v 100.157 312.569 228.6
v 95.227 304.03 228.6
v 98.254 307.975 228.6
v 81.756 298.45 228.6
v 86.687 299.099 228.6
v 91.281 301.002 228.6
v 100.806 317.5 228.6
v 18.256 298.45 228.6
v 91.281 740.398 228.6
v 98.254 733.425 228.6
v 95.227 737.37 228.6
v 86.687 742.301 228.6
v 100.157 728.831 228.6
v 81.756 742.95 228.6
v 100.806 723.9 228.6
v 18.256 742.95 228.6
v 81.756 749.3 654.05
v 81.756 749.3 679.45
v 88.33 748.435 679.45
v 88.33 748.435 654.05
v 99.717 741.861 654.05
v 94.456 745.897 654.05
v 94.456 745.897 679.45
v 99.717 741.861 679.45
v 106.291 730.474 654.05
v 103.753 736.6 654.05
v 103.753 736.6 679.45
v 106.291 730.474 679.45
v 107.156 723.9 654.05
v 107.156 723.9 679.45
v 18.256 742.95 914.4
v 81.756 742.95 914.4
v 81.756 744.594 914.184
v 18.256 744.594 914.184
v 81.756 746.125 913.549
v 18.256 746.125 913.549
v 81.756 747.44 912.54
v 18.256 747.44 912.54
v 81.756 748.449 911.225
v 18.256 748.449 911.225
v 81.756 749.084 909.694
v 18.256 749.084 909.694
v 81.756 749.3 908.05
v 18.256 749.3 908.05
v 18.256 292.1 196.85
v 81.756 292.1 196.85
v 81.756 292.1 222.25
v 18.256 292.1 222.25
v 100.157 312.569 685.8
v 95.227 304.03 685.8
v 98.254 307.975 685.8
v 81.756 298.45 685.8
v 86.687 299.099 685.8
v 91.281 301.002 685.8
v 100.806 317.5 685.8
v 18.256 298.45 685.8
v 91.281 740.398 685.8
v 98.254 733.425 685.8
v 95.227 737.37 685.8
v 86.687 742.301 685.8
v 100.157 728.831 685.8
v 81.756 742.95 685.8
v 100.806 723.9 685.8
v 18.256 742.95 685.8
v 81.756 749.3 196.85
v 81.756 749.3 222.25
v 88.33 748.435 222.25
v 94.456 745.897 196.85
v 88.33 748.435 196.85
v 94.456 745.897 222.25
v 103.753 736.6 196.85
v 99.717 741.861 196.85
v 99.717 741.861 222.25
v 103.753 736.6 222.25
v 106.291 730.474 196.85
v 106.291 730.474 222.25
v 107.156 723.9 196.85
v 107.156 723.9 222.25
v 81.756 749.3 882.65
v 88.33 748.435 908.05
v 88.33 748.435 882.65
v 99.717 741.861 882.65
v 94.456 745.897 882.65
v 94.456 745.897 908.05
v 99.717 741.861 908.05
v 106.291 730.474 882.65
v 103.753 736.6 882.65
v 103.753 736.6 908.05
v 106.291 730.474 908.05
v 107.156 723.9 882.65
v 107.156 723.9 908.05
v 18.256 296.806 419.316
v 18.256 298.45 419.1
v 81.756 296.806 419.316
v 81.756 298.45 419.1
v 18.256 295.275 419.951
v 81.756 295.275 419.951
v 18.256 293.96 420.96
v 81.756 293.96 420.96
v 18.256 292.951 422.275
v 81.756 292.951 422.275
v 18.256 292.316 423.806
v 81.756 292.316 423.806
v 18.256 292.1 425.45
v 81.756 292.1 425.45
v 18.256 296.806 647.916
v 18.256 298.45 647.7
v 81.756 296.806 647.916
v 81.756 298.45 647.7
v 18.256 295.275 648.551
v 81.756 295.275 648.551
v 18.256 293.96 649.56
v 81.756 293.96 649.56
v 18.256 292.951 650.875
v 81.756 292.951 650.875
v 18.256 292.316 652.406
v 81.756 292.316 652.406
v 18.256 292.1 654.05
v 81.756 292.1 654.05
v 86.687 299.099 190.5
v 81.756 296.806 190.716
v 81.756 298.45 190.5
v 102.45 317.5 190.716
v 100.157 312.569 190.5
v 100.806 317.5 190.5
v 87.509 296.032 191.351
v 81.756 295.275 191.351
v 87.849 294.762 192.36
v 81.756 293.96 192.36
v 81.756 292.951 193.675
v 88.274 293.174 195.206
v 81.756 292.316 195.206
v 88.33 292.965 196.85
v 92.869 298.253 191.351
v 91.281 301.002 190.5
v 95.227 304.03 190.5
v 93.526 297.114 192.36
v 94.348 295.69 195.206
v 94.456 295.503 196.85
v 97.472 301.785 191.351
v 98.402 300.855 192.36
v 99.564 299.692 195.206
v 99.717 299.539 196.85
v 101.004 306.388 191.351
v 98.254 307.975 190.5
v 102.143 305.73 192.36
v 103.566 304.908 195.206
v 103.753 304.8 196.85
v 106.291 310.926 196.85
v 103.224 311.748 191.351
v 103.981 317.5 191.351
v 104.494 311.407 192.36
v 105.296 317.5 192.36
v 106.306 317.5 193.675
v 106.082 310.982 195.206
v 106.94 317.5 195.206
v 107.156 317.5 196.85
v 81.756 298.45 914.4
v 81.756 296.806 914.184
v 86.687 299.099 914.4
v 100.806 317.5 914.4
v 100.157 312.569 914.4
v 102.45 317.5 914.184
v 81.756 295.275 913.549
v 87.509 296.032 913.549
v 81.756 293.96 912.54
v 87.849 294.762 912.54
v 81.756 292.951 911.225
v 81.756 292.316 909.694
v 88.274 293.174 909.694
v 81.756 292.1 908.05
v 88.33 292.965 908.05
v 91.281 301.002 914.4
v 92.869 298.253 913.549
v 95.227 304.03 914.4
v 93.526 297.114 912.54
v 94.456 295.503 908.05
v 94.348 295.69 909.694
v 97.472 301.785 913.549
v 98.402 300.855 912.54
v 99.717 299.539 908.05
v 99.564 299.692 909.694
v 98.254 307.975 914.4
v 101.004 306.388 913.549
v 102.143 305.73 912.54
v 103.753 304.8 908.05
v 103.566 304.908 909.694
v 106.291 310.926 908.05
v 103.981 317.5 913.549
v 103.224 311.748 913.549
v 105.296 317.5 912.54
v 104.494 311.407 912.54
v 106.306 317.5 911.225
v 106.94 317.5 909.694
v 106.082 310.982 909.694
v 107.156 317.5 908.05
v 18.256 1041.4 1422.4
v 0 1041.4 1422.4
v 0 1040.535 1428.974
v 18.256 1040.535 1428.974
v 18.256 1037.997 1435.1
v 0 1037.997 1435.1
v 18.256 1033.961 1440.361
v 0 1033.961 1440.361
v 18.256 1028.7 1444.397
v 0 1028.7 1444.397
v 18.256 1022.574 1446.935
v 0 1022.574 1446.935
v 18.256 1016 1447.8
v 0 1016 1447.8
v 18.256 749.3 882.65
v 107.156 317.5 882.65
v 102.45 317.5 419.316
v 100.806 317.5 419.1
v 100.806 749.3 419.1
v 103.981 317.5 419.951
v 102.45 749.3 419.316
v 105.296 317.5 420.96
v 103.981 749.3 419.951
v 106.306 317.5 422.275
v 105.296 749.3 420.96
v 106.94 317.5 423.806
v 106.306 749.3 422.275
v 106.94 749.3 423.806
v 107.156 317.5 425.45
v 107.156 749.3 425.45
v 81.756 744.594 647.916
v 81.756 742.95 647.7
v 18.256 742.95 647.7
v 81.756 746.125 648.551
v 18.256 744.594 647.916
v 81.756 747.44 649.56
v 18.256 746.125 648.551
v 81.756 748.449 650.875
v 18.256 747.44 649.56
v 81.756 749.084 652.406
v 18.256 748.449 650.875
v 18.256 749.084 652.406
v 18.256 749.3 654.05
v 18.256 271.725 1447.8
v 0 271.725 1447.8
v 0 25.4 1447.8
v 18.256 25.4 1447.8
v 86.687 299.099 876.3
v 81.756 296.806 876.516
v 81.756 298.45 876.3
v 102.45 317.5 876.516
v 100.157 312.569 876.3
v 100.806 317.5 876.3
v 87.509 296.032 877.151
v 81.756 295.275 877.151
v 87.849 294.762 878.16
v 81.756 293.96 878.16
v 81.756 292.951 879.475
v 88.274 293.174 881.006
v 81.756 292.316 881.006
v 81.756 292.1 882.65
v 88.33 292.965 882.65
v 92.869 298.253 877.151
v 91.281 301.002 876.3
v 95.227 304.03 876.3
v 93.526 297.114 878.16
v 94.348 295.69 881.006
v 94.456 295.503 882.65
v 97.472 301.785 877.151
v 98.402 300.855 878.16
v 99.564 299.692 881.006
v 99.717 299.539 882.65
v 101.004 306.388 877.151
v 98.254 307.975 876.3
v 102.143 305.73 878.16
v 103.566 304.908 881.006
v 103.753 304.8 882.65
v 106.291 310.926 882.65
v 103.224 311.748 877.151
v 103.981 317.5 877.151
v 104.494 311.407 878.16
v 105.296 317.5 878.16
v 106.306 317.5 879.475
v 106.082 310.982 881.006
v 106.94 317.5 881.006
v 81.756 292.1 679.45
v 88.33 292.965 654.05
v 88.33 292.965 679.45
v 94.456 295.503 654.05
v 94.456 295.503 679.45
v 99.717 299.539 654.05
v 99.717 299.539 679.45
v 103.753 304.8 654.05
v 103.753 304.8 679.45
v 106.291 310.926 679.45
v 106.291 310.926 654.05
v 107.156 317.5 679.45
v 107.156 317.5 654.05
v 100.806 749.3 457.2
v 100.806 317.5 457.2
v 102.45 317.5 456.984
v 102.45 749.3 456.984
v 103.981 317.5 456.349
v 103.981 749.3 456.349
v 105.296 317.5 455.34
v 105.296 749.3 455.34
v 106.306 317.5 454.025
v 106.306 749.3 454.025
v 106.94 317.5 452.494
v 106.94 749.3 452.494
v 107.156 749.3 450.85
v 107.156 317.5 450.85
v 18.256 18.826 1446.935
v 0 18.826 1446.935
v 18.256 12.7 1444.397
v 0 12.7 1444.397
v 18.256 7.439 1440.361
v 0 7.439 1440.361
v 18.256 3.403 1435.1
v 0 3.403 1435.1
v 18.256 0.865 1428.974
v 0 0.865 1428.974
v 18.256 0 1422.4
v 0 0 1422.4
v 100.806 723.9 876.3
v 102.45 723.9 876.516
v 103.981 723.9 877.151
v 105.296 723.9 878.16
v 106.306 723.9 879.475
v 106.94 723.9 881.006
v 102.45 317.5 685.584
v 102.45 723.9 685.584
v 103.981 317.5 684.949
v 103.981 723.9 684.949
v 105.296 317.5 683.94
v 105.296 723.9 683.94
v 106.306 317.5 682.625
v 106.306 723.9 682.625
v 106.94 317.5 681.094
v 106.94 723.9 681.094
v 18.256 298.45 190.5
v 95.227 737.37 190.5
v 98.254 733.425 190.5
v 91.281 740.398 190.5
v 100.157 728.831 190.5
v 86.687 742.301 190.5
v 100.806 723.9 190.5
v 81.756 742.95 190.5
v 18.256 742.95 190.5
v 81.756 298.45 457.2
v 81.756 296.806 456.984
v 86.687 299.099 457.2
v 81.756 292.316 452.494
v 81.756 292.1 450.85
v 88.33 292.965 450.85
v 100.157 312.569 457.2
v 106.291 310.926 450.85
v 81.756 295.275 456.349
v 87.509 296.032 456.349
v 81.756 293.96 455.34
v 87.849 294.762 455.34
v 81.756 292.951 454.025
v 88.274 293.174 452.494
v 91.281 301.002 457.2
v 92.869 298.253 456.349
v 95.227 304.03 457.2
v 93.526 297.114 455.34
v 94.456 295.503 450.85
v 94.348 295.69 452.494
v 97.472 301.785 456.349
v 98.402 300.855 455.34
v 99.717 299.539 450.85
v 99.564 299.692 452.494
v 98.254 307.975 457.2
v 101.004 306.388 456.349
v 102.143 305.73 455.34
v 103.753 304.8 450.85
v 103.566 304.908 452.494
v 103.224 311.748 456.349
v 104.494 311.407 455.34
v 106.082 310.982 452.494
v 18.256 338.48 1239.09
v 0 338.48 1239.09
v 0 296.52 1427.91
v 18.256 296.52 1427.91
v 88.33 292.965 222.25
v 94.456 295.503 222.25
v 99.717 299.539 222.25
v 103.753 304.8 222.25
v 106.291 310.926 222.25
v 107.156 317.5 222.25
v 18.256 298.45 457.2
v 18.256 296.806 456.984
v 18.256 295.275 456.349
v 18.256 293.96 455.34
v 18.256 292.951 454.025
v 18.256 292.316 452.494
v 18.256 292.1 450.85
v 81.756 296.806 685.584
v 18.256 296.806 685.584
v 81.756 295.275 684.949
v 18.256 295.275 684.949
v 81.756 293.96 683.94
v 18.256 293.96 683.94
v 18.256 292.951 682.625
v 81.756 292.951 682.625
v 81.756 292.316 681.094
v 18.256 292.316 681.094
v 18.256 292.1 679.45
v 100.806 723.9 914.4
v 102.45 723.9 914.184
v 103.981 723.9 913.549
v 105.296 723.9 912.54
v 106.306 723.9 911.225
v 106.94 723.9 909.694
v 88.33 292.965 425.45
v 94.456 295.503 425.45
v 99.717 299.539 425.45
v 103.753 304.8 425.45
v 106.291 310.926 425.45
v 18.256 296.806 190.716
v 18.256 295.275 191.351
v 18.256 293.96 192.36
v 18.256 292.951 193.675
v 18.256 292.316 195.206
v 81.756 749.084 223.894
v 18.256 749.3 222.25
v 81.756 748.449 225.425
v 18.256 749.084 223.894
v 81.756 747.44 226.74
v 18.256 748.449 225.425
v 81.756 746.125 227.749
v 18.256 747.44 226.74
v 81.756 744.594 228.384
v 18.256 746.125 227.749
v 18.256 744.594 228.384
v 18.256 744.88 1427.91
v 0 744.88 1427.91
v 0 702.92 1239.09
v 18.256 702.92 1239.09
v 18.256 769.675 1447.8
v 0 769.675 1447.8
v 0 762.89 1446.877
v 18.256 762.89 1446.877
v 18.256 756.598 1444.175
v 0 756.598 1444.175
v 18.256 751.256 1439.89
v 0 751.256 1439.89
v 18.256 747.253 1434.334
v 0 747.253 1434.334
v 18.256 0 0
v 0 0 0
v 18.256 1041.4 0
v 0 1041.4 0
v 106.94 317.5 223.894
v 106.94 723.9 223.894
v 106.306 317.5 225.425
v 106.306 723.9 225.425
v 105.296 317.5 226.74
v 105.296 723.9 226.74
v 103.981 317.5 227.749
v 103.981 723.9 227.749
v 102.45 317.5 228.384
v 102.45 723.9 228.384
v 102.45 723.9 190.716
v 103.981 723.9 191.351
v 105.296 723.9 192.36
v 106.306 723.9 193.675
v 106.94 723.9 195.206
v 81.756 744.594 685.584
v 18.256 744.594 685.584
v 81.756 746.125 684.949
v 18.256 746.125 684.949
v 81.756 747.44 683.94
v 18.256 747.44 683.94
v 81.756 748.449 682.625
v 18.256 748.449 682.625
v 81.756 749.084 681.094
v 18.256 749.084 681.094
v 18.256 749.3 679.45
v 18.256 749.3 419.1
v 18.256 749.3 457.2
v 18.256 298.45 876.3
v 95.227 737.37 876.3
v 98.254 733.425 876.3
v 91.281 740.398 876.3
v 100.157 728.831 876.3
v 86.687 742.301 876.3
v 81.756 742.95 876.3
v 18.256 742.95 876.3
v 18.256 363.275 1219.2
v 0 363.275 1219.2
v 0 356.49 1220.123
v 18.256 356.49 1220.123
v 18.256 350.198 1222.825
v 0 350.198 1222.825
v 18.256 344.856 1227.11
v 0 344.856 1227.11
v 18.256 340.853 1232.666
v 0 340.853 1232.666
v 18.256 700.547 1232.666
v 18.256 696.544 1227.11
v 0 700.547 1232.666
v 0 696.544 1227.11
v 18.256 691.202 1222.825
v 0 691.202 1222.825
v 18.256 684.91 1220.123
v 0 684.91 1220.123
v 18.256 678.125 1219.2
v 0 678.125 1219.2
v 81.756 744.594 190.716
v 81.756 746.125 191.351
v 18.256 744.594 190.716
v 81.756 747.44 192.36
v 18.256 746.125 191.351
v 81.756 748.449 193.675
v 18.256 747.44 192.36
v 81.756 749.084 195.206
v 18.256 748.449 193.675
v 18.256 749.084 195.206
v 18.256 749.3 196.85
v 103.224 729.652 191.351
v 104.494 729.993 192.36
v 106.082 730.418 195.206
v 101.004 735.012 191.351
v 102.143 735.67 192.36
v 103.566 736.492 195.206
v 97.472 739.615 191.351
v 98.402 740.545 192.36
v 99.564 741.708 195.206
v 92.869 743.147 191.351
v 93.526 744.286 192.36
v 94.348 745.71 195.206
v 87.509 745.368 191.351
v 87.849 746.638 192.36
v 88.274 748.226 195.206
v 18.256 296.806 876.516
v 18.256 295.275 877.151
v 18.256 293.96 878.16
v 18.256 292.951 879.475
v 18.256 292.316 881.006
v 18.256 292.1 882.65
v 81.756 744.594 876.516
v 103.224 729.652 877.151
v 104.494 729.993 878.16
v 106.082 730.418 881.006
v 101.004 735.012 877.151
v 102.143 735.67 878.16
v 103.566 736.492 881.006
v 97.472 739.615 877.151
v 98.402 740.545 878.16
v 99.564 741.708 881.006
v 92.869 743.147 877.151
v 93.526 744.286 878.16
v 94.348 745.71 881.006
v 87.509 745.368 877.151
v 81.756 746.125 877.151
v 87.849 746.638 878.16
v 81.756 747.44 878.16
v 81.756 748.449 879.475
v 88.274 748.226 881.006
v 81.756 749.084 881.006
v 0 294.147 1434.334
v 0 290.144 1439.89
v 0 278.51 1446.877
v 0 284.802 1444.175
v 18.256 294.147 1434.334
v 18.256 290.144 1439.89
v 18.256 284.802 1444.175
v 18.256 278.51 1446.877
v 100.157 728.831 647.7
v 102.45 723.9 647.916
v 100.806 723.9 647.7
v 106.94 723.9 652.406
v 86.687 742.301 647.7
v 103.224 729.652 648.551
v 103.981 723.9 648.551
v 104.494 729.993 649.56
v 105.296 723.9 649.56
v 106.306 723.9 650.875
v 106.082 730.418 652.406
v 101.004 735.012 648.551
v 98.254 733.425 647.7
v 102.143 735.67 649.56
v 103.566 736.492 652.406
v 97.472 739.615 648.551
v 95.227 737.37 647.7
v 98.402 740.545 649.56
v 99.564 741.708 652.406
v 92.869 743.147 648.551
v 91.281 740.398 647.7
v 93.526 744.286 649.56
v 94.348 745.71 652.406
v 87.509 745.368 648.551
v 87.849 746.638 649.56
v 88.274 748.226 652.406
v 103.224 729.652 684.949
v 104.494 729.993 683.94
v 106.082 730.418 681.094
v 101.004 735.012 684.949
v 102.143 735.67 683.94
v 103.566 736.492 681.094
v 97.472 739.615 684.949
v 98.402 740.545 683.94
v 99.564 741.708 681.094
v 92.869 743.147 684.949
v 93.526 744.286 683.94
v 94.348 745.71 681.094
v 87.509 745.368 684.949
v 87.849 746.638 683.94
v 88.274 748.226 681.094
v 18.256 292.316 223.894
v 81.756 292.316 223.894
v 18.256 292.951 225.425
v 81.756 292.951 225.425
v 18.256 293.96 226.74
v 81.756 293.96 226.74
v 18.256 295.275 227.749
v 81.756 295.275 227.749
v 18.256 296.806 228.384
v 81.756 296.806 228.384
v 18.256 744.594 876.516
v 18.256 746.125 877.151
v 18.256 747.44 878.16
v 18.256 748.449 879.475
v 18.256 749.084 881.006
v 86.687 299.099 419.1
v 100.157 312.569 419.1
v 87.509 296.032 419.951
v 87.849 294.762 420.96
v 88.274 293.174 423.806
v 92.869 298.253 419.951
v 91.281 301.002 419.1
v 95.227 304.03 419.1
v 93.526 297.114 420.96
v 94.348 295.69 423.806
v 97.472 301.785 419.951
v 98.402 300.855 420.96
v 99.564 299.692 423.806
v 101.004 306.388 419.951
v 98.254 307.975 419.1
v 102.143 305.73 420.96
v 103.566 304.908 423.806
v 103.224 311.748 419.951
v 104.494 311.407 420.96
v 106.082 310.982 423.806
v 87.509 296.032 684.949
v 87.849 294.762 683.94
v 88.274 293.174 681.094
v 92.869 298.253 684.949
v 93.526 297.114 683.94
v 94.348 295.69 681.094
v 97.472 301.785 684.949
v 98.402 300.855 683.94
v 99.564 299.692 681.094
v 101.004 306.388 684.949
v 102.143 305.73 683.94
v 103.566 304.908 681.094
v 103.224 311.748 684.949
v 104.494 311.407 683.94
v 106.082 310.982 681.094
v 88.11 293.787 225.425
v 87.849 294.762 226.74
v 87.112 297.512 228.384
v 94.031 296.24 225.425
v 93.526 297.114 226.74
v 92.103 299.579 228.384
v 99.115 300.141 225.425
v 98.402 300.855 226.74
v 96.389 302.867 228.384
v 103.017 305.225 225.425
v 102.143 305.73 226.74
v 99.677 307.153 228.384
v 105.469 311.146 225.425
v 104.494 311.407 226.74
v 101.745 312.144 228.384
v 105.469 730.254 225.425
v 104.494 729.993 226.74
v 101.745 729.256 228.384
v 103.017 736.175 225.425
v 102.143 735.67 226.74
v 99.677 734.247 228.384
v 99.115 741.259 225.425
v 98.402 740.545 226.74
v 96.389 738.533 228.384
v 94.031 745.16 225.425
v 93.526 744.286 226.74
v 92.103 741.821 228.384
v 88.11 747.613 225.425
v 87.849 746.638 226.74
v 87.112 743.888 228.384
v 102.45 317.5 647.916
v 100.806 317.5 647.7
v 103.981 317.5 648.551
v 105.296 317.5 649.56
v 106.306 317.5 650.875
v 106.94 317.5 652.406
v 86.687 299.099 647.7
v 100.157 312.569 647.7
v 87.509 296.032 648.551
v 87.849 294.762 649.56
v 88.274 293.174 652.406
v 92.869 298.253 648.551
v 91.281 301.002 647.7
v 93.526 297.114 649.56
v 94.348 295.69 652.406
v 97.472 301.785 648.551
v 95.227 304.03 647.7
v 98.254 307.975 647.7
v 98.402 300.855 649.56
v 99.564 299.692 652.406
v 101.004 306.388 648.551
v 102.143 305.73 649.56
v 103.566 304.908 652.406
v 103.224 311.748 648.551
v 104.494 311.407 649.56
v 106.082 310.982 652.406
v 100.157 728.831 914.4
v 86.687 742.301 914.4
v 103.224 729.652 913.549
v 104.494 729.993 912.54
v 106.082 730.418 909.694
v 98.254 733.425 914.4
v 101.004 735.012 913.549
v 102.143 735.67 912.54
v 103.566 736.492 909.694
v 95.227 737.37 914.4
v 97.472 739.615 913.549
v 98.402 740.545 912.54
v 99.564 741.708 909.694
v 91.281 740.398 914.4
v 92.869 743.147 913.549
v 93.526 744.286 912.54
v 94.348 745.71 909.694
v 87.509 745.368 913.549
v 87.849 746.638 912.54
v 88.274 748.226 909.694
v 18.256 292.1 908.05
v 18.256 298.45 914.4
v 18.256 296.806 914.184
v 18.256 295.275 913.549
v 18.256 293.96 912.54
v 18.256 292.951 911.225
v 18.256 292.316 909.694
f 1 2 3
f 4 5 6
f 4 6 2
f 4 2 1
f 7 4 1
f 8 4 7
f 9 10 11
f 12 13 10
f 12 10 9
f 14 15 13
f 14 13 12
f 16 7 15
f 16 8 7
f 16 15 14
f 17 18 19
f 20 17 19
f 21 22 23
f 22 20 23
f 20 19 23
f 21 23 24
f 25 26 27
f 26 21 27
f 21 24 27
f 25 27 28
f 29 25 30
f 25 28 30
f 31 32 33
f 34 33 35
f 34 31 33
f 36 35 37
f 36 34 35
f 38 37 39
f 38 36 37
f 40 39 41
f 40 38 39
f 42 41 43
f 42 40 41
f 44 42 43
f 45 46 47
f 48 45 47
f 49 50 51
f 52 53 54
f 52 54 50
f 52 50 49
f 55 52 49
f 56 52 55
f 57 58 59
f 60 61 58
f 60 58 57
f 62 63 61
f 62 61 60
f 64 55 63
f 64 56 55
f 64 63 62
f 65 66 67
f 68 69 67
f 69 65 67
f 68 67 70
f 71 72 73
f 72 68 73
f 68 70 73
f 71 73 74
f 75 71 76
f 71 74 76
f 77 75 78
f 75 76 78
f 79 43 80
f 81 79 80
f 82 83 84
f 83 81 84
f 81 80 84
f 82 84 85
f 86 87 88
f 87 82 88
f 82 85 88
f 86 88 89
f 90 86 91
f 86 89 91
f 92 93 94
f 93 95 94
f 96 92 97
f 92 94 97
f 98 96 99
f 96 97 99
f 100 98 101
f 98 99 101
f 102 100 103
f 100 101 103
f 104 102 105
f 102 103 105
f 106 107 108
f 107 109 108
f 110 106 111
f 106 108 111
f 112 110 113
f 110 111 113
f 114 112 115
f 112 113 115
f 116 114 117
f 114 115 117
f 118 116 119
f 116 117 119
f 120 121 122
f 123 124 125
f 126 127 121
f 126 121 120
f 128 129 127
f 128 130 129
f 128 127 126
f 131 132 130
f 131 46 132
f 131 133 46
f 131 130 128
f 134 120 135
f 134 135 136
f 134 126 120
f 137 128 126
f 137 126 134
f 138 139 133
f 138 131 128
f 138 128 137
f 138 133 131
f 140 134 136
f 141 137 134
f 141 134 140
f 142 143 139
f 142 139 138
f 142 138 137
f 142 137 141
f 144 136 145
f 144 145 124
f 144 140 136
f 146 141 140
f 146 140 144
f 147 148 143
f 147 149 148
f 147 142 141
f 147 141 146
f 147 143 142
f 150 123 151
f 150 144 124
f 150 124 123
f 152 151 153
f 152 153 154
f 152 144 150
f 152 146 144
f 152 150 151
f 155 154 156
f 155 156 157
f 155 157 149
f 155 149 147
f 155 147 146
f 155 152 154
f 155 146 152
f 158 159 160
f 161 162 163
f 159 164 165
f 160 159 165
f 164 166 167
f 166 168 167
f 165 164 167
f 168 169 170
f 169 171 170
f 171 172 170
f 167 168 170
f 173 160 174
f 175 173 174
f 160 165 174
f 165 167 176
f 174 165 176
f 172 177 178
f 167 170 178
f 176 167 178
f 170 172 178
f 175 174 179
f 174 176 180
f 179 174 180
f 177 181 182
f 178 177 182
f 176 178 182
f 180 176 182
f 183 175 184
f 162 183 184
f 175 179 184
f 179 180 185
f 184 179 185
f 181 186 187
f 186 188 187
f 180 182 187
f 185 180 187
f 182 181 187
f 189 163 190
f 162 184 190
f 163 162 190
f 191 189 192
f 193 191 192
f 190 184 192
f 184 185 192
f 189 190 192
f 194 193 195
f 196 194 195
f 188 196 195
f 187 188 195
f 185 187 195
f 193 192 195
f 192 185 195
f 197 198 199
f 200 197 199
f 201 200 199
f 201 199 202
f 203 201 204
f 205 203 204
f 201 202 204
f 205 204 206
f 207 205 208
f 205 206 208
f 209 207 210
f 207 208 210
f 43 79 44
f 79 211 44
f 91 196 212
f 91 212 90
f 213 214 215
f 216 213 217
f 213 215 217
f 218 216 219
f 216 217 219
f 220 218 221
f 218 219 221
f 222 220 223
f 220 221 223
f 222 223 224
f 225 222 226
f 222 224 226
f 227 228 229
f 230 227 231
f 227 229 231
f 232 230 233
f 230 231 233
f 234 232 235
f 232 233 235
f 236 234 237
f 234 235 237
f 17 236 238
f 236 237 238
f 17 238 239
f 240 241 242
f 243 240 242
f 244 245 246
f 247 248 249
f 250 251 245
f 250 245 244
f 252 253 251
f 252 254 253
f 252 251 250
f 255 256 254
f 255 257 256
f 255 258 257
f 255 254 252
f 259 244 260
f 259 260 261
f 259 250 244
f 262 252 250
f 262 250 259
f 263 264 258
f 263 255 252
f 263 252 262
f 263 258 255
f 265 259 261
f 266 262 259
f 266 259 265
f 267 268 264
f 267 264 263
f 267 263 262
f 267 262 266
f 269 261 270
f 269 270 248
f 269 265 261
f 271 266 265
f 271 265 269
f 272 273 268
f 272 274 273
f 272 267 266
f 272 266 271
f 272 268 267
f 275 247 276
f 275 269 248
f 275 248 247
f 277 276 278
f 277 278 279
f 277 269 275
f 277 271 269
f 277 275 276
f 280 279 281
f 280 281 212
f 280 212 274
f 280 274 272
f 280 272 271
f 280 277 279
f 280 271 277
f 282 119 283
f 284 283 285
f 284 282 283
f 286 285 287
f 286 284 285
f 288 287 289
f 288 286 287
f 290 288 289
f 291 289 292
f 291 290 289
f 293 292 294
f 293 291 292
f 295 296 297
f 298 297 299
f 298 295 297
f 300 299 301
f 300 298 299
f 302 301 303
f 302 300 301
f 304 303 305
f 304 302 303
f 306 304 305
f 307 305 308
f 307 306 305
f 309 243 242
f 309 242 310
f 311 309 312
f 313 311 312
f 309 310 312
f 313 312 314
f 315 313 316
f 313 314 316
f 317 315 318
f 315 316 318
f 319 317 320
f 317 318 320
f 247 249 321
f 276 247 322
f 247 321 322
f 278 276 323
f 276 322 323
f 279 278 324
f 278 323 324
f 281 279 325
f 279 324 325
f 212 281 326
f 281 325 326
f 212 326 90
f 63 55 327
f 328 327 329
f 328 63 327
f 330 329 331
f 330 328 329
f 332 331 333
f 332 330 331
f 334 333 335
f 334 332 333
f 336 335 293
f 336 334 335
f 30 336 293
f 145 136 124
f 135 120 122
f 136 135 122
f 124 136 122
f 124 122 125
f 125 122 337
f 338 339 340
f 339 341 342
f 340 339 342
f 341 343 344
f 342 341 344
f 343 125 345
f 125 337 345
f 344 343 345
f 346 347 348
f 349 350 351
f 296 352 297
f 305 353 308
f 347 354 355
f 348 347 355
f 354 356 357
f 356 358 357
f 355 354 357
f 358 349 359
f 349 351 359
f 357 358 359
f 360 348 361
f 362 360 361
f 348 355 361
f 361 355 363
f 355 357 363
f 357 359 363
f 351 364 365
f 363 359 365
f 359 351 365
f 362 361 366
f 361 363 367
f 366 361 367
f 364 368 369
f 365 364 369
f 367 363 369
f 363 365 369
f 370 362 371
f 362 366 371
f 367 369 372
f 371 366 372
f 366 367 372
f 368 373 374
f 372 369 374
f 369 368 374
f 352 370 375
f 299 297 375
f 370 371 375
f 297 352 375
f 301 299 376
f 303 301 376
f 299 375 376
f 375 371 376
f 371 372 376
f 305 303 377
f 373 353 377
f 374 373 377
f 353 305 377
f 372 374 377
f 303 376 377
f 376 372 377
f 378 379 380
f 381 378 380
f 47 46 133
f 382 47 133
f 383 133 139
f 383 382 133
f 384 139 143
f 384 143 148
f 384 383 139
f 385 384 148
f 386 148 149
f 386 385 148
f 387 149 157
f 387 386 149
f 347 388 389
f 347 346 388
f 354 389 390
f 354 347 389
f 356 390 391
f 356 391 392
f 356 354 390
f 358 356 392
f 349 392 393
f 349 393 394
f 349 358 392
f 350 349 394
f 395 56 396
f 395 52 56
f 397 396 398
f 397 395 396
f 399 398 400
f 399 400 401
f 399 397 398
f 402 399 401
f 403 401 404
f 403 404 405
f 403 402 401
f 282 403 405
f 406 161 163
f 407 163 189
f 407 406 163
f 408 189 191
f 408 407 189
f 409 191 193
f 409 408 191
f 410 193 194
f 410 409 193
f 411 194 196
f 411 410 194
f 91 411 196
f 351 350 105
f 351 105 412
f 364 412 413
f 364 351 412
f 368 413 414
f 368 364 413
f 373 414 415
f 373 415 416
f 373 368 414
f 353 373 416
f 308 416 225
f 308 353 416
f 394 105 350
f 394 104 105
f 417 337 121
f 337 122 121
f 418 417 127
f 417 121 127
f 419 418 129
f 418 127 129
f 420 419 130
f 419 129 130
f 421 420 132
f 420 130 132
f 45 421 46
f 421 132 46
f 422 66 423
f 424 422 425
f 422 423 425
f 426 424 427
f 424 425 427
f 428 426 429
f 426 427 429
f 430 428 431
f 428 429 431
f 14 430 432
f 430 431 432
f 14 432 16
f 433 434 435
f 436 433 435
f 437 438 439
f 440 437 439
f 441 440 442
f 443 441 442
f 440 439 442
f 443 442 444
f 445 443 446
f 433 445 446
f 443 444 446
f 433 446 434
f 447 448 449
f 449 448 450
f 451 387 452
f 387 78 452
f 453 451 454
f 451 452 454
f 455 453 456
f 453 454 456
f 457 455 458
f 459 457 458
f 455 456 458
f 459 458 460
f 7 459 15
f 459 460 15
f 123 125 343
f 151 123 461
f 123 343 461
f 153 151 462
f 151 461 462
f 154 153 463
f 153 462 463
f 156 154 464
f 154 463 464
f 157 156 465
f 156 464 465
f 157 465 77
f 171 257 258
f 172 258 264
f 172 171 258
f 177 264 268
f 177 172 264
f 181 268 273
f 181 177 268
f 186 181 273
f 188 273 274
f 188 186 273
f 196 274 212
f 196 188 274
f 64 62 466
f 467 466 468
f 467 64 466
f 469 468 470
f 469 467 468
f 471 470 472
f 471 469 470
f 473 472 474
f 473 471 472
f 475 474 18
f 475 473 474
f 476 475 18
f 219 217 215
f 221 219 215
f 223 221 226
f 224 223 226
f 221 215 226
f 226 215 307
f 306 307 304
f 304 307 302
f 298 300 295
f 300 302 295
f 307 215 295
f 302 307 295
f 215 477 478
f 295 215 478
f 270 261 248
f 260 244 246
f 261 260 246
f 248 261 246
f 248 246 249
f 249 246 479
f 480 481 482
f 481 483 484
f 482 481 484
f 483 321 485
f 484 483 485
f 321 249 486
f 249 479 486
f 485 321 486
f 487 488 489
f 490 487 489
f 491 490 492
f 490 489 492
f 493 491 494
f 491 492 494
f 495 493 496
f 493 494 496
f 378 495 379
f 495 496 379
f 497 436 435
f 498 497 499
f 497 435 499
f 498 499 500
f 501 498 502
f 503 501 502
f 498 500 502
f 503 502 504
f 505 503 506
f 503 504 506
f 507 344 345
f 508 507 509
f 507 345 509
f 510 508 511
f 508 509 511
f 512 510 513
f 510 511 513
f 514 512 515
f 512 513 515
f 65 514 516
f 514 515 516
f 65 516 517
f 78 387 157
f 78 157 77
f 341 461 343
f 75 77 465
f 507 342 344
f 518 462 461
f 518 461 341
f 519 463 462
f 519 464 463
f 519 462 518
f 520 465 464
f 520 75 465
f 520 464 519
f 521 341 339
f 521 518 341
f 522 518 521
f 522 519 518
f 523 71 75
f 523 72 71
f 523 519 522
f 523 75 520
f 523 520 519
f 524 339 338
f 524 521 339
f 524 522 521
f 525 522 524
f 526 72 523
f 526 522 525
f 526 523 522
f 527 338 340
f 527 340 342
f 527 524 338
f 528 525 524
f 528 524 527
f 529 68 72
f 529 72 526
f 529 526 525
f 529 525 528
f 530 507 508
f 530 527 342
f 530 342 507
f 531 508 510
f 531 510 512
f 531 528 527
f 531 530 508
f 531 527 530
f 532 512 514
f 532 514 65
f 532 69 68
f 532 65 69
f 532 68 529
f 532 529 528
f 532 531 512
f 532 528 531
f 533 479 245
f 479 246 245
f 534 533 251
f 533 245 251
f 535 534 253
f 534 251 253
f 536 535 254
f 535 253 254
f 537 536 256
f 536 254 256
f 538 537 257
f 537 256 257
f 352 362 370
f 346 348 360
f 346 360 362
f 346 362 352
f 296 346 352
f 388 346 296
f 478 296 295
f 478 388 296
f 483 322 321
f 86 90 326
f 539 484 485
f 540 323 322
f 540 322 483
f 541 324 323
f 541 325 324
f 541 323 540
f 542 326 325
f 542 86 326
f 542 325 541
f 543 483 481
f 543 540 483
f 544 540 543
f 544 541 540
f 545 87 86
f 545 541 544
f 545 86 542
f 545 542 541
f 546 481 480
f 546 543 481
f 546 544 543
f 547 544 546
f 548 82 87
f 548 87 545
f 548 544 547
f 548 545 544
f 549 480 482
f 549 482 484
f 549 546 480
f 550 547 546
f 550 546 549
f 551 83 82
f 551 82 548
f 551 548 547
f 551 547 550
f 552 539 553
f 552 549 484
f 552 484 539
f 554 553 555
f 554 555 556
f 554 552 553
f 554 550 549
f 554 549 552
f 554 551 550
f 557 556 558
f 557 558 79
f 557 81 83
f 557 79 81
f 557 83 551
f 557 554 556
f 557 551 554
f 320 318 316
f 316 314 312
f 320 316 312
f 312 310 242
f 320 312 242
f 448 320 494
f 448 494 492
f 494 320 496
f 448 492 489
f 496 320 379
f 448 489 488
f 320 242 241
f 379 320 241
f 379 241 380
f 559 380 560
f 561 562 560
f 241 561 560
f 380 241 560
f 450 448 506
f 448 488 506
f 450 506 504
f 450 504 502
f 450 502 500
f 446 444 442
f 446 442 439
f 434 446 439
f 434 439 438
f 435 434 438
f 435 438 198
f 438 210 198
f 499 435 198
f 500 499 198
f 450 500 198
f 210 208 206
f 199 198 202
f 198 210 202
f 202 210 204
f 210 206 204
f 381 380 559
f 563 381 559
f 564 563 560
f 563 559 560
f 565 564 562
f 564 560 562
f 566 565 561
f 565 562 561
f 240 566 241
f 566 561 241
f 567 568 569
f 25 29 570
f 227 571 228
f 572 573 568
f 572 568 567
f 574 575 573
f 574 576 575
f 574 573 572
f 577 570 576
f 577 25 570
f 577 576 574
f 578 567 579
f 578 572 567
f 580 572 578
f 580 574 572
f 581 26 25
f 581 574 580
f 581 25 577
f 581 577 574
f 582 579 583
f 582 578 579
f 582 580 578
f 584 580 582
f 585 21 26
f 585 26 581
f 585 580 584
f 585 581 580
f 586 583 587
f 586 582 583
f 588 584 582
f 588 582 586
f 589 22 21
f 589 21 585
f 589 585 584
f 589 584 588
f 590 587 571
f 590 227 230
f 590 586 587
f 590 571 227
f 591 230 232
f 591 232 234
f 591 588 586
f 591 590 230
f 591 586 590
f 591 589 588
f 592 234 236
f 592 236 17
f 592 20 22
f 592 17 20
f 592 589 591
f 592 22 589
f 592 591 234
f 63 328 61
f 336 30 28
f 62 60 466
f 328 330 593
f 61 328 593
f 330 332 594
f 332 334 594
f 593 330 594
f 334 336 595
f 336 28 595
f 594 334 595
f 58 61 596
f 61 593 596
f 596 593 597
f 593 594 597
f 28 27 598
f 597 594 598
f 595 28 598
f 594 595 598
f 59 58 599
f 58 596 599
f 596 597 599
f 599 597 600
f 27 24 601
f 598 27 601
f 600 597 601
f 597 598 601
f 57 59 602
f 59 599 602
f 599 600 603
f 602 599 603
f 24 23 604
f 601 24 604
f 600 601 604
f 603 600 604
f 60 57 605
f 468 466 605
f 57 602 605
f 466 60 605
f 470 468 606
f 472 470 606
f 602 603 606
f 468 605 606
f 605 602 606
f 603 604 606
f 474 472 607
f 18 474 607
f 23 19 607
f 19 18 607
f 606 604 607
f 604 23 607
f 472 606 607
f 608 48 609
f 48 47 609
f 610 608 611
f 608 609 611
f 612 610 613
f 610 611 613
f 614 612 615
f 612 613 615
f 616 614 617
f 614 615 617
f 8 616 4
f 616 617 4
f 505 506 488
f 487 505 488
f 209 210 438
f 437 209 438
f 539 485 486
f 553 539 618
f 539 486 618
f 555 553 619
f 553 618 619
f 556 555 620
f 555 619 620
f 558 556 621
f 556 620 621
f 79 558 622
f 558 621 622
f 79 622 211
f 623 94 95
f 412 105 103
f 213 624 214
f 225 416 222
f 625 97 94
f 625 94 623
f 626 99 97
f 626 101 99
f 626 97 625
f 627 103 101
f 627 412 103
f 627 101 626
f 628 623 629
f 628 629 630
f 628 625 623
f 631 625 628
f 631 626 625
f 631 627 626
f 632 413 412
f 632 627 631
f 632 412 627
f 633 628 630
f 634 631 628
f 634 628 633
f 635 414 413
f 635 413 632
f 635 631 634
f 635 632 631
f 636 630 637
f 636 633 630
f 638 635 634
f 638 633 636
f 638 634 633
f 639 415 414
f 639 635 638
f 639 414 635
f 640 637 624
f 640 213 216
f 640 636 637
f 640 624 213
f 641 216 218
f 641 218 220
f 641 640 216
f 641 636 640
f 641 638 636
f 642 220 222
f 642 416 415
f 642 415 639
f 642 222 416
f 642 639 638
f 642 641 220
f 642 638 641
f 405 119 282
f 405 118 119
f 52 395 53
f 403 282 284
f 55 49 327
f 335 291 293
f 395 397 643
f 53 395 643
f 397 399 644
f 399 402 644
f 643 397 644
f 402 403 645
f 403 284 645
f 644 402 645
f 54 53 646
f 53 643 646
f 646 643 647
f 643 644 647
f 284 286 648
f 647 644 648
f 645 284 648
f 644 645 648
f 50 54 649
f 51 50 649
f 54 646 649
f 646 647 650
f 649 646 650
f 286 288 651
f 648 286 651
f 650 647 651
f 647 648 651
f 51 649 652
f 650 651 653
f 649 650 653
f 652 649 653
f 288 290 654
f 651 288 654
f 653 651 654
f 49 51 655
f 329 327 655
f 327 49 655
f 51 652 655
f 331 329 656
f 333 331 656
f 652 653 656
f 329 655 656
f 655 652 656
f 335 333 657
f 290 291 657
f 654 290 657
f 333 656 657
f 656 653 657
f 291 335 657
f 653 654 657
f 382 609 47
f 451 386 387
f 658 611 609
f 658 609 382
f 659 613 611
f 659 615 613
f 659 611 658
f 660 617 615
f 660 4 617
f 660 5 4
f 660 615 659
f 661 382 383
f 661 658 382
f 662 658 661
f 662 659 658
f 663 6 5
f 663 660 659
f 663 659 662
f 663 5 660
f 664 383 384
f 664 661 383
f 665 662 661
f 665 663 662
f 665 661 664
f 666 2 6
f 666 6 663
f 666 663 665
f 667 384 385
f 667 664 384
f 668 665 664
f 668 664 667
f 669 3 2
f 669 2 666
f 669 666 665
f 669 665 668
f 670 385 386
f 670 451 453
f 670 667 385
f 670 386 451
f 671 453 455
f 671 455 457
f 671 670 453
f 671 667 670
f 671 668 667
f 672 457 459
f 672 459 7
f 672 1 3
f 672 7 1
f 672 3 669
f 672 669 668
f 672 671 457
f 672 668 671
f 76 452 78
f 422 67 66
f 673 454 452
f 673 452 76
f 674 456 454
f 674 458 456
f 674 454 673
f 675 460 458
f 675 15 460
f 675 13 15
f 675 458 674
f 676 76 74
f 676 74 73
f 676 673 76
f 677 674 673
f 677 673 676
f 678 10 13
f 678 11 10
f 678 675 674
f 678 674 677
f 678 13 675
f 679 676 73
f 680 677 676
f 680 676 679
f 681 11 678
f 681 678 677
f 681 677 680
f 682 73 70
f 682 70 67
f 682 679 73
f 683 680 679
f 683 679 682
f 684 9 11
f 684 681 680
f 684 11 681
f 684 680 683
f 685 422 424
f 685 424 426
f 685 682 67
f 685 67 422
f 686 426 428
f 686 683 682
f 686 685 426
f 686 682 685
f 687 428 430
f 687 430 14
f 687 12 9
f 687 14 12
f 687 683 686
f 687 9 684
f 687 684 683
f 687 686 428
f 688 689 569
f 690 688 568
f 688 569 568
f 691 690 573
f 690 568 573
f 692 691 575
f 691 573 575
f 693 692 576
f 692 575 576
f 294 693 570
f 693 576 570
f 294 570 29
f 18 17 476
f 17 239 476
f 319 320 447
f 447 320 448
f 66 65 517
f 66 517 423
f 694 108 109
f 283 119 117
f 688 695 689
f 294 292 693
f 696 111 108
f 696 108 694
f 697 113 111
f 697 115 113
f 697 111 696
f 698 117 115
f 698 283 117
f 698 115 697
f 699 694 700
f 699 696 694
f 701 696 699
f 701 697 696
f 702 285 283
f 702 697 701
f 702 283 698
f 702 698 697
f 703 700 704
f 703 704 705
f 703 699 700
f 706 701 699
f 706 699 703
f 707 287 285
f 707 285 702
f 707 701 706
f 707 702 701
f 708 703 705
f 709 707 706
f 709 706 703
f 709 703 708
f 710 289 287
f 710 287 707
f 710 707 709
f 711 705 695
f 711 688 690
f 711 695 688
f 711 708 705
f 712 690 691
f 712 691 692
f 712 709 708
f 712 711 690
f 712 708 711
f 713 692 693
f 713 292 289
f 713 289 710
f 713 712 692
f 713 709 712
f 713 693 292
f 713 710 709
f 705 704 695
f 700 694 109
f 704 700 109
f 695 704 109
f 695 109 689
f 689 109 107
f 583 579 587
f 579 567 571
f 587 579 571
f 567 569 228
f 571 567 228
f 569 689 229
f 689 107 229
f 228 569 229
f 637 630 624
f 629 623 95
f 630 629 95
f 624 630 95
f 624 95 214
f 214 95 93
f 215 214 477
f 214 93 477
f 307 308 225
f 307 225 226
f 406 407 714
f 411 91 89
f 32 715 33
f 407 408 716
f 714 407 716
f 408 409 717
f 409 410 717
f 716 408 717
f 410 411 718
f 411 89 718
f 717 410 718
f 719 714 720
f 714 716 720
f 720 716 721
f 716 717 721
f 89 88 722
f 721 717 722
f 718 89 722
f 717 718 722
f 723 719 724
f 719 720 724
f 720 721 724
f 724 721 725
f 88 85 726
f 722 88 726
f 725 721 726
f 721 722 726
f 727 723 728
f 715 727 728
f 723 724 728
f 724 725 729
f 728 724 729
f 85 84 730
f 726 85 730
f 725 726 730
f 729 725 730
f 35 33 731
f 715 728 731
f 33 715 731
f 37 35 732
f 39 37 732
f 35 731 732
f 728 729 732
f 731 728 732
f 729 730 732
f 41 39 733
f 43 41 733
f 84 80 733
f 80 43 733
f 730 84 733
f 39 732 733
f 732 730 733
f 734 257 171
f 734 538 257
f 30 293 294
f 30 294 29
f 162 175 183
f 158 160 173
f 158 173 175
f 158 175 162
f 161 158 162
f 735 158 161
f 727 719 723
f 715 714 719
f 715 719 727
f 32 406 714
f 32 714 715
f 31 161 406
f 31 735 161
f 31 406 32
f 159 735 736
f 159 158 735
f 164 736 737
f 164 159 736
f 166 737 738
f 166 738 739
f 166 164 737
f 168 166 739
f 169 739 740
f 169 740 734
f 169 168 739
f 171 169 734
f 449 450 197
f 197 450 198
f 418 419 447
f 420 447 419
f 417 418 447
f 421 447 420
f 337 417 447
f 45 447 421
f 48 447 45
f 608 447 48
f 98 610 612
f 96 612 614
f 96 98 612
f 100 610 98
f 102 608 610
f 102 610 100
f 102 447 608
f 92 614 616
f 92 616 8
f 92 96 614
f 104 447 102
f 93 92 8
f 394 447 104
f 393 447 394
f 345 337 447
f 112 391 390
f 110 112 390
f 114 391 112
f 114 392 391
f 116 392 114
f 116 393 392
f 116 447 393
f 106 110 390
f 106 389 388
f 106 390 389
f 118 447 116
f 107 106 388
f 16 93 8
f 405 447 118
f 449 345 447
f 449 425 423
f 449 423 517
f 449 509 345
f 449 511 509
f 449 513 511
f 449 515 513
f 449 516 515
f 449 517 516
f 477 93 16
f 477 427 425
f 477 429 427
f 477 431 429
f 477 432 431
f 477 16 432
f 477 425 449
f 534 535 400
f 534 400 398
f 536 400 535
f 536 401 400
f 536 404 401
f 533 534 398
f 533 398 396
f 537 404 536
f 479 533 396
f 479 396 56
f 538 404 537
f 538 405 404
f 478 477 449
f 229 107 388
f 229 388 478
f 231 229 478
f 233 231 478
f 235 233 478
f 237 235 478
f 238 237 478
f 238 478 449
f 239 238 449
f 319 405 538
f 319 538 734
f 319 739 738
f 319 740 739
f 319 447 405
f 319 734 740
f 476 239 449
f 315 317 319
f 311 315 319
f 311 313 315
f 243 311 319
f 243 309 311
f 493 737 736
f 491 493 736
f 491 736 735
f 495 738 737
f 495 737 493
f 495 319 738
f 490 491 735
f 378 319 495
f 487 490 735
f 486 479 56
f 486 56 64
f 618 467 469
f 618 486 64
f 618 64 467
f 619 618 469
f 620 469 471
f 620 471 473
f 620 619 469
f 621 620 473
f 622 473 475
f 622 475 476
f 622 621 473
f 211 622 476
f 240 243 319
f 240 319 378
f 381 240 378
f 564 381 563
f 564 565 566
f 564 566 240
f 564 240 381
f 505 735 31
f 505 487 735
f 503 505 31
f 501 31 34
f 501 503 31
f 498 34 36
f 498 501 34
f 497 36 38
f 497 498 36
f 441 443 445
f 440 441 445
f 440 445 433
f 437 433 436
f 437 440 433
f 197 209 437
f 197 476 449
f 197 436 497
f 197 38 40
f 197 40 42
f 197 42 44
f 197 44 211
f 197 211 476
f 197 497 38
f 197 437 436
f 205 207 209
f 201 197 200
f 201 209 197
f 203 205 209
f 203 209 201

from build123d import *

# Parameters (mm, degrees)
F1_DEPTH = 18.25625
F2_W     = 457.2
F2_H     = 38.1
F3_DEPTH = 88.9
F4_R     = 25.4
F5_R     = 6.35


with BuildPart() as f1:
    # F0 (on Right) → F1 (new body)
    with BuildSketch(Plane.YZ):
        with BuildLine():
            Line((0, 1422.4), (0, 0))
            Line((0, 0), (1041.4, 0))
            Line((1041.4, 0), (1041.4, 1422.4))
            ThreePointArc((1041.4, 1422.4), (1033.960512, 1440.360512), (1016, 1447.8))
            Line((1016, 1447.8), (769.675159, 1447.8))
            ThreePointArc((769.675159, 1447.8), (753.781683, 1442.213062), (744.880007, 1427.910034))
            Line((744.880007, 1427.910034), (702.919993, 1239.089966))
            ThreePointArc((702.919993, 1239.089966), (694.018317, 1224.786938), (678.124841, 1219.2))
            Line((678.124841, 1219.2), (363.275159, 1219.2))
            ThreePointArc((363.275159, 1219.2), (347.381683, 1224.786938), (338.480007, 1239.089966))
            Line((338.480007, 1239.089966), (296.519993, 1427.910034))
            ThreePointArc((296.519993, 1427.910034), (287.618317, 1442.213062), (271.724841, 1447.8))
            Line((271.724841, 1447.8), (25.4, 1447.8))
            ThreePointArc((25.4, 1447.8), (7.439488, 1440.360512), (0, 1422.4))
        make_face()
    extrude(amount=F1_DEPTH)

    # F2 (on face) → F3 (join)
    with BuildSketch(Plane.YZ.offset(18.25625)):
        with Locations((520.7, 209.55)):
            Rectangle(F2_W, F2_H)
        with Locations((520.7, 438.15)):
            Rectangle(F2_W, F2_H)
        with Locations((520.7, 666.75)):
            Rectangle(F2_W, F2_H)
        with Locations((520.7, 895.35)):
            Rectangle(F2_W, F2_H)
    extrude(amount=F3_DEPTH)

    # F4
    f4_edges = [f1.edges().sort_by_distance(p)[0] for p in [
        (107.15625, 292.1, 895.35),
        (107.15625, 749.3, 895.35),
        (107.15625, 292.1, 666.75),
        (107.15625, 749.3, 666.75),
        (107.15625, 292.1, 438.15),
        (107.15625, 292.1, 209.55),
        (107.15625, 749.3, 209.55),
    ]]
    fillet(f4_edges, radius=F4_R)

    # F5
    f5_edges = [f1.edges().sort_by_distance(p)[0] for p in [
        (50.00625, 292.1, 914.4),
        (50.00625, 292.1, 876.3),
        (50.00625, 292.1, 685.8),
        (50.00625, 292.1, 647.7),
        (50.00625, 292.1, 457.2),
        (50.00625, 292.1, 419.1),
        (50.00625, 292.1, 228.6),
        (50.00625, 292.1, 190.5),
    ]]
    fillet(f5_edges, radius=F5_R)


solid = f1.part
